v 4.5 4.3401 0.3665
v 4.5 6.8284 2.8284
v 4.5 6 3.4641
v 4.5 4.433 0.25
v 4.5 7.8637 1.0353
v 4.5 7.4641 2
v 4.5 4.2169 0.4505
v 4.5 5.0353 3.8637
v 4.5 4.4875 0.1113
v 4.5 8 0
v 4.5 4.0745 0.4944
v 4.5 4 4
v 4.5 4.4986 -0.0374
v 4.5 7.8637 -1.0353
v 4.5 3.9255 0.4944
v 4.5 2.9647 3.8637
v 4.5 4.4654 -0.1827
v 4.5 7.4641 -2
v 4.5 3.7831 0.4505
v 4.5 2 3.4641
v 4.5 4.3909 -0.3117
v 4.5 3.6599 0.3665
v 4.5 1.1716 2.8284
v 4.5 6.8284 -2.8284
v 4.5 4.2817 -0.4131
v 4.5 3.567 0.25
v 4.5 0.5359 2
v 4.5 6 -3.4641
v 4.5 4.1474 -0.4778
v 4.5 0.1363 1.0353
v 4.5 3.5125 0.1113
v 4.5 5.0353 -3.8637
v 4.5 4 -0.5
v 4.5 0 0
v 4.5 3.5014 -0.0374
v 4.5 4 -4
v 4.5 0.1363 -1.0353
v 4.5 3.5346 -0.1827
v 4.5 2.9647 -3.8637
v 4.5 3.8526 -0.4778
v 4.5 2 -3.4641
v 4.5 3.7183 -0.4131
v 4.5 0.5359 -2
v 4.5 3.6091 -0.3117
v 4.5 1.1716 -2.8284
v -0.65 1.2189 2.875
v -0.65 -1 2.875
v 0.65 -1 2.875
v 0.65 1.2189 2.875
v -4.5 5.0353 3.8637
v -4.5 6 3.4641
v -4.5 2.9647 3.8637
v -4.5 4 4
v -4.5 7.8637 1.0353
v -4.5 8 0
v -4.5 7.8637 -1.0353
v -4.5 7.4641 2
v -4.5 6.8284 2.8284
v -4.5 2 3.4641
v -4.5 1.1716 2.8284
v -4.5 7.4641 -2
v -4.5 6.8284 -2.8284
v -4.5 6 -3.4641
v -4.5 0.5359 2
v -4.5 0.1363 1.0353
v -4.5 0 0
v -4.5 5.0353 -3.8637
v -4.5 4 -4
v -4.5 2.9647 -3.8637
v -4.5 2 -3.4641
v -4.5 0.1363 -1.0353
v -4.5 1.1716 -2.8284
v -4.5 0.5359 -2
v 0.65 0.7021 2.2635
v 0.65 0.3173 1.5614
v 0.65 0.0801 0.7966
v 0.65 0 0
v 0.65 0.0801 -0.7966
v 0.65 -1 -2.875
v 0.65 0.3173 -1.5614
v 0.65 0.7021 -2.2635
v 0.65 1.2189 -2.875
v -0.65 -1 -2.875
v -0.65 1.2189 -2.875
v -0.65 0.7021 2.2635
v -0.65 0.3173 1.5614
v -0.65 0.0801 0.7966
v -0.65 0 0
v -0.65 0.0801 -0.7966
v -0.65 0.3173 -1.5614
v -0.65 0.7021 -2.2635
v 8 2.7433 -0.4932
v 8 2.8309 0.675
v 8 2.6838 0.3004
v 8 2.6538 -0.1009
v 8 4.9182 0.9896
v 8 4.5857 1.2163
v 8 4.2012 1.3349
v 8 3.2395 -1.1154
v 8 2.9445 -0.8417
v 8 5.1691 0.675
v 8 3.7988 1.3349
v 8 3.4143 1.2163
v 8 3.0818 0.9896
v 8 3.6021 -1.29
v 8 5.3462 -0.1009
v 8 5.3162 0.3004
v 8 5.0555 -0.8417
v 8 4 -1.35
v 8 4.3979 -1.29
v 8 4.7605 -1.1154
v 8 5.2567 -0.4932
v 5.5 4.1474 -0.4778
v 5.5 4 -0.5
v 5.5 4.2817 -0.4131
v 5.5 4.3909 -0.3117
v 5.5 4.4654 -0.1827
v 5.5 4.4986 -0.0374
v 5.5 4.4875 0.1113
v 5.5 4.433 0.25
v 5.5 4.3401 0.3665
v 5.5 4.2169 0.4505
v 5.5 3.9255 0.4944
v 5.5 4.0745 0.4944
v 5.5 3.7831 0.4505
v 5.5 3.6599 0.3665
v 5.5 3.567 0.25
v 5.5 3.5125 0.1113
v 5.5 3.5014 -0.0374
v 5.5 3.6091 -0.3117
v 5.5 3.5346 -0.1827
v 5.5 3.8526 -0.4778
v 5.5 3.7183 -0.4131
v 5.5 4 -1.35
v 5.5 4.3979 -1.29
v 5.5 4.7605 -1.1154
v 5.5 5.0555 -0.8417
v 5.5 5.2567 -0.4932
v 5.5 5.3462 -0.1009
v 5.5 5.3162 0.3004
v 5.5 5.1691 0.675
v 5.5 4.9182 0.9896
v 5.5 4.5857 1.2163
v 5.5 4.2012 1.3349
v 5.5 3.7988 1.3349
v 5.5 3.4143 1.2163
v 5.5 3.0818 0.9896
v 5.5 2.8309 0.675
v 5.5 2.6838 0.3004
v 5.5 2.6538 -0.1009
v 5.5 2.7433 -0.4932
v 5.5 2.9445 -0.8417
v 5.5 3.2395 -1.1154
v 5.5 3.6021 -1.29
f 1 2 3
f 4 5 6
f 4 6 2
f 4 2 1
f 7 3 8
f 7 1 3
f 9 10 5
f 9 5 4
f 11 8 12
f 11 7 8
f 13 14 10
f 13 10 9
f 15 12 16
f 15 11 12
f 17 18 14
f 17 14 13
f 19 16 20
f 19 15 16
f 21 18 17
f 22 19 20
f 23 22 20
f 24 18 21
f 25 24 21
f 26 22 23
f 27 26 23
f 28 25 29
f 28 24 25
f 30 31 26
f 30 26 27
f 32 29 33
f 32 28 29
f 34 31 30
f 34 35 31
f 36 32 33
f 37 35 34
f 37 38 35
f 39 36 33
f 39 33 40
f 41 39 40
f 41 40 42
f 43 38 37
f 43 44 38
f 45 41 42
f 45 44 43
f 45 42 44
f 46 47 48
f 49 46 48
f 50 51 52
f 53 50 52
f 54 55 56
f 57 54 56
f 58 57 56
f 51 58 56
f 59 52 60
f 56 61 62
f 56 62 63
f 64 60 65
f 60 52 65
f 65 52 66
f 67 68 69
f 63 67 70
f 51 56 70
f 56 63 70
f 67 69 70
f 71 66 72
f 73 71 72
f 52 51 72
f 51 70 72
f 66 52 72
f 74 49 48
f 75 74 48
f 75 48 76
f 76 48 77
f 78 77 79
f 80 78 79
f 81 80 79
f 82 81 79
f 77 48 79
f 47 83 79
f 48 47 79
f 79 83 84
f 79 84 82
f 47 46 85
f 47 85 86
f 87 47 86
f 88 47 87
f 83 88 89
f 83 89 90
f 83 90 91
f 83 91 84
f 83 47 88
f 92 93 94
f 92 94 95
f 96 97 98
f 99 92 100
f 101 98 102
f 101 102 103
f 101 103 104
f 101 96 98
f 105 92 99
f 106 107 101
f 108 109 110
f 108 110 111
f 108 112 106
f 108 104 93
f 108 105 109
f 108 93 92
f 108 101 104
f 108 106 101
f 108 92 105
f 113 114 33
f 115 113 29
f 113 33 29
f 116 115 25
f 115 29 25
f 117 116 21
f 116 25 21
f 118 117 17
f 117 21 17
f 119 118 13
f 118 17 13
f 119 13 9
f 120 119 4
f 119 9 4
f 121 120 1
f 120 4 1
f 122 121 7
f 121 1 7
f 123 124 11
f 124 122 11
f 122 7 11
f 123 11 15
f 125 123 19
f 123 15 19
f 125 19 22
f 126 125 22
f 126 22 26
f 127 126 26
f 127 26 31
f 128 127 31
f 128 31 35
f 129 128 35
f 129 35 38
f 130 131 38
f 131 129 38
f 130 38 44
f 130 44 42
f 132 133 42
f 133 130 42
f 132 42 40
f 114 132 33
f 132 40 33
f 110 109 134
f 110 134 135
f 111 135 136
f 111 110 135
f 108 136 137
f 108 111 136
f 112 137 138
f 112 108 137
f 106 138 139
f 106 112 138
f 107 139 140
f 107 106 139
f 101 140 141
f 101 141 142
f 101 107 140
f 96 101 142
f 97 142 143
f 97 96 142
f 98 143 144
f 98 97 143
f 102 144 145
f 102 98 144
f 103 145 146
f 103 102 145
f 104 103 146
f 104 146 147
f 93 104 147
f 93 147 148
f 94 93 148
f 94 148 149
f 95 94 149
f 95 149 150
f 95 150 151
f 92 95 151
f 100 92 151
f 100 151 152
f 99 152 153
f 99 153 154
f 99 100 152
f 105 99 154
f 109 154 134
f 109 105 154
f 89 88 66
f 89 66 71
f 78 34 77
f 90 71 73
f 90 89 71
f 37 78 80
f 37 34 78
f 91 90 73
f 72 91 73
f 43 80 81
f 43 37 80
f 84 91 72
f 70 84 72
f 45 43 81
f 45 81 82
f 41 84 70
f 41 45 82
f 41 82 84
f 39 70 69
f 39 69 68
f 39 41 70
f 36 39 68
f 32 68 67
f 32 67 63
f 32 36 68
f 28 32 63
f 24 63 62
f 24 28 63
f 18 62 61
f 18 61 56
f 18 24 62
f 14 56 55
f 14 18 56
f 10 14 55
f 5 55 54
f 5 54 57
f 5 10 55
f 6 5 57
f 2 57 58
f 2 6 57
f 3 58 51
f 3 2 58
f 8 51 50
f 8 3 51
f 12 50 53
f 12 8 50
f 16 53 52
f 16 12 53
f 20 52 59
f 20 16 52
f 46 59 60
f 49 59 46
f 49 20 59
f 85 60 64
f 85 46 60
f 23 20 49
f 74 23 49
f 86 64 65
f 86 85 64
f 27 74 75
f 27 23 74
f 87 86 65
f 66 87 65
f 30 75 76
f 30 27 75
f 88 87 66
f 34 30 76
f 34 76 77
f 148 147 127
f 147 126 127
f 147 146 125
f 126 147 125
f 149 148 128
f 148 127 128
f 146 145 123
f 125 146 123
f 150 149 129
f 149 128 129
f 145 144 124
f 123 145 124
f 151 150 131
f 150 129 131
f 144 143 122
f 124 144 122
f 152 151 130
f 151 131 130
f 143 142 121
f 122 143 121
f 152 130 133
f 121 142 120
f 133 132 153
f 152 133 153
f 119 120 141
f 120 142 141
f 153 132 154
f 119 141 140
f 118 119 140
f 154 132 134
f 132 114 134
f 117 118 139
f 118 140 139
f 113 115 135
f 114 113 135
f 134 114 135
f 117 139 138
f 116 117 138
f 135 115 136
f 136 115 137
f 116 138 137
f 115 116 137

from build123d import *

# Parameters (mm, degrees)
SKETCH4_W                       = 9
SKETCH4_H                       = 4
BOSS_EXTRUDE1_REACH             = 12.012
BOSS_EXTRUDE1_END_RADIUS        = 4
SKETCH5_W                       = 1.3
SKETCH5_H                       = 5.75
BOSS_EXTRUDE1_DIRECTION_2_DEPTH = 1
SKETCH6_R                       = 0.5
BOSS_EXTRUDE2_DEPTH             = 3.5
SKETCH7_R                       = 1.35
BOSS_EXTRUDE3_DEPTH             = 2.5


with BuildPart() as part:
    # Sketch4 → Revolve3 (revolve)
    with BuildSketch(Plane.XY):
        with Locations((0, 2)):
            Rectangle(SKETCH4_W, SKETCH4_H)
    revolve(axis=Axis((-4.5, 4, 0), (1, 0, 0)))

    # Boss-Extrude1: up to this cylinder (the profile starts outside it)
    boss_extrude1_end = Plane(origin=(0, 4, 0), z_dir=(-1, 0, 0)) * Cylinder(BOSS_EXTRUDE1_END_RADIUS, 33.024, mode=Mode.PRIVATE)
    # Sketch5 → Boss-Extrude1 (add, up to the surface)
    with BuildSketch(Plane(origin=(0, 0, 0), x_dir=(1, 0, 0), z_dir=(0, 1, 0)), mode=Mode.PRIVATE) as boss_extrude1_sk1:
        Rectangle(SKETCH5_W, SKETCH5_H)
    boss_extrude1_tool1 = extrude(boss_extrude1_sk1.sketch, amount=BOSS_EXTRUDE1_REACH, mode=Mode.PRIVATE) - boss_extrude1_end
    add(boss_extrude1_tool1.solids().sort_by_distance((0, 0, 0))[0])
    add(boss_extrude1_tool1.solids().sort_by_distance((0, 0, 0))[1])

    # Sketch5 → Boss-Extrude1 direction 2 (add)
    with BuildSketch(Plane(origin=(0, 0, 0), x_dir=(1, 0, 0), z_dir=(0, 1, 0))):
        Rectangle(SKETCH5_W, SKETCH5_H)
    extrude(amount=-BOSS_EXTRUDE1_DIRECTION_2_DEPTH)

    # Sketch6 → Boss-Extrude2 (add)
    with BuildSketch(Plane(origin=(4.5, 0, 0), x_dir=(0, 0, -1), z_dir=(1, 0, 0))):
        with Locations((0, 4)):
            Circle(SKETCH6_R)
    extrude(amount=BOSS_EXTRUDE2_DEPTH)

    # Sketch7 → Boss-Extrude3 (add)
    with BuildSketch(Plane(origin=(8, 0, 0), x_dir=(0, 0, -1), z_dir=(1, 0, 0))):
        with Locations((0, 4)):
            Circle(SKETCH7_R)
    extrude(amount=-BOSS_EXTRUDE3_DEPTH)


solid = part.part
